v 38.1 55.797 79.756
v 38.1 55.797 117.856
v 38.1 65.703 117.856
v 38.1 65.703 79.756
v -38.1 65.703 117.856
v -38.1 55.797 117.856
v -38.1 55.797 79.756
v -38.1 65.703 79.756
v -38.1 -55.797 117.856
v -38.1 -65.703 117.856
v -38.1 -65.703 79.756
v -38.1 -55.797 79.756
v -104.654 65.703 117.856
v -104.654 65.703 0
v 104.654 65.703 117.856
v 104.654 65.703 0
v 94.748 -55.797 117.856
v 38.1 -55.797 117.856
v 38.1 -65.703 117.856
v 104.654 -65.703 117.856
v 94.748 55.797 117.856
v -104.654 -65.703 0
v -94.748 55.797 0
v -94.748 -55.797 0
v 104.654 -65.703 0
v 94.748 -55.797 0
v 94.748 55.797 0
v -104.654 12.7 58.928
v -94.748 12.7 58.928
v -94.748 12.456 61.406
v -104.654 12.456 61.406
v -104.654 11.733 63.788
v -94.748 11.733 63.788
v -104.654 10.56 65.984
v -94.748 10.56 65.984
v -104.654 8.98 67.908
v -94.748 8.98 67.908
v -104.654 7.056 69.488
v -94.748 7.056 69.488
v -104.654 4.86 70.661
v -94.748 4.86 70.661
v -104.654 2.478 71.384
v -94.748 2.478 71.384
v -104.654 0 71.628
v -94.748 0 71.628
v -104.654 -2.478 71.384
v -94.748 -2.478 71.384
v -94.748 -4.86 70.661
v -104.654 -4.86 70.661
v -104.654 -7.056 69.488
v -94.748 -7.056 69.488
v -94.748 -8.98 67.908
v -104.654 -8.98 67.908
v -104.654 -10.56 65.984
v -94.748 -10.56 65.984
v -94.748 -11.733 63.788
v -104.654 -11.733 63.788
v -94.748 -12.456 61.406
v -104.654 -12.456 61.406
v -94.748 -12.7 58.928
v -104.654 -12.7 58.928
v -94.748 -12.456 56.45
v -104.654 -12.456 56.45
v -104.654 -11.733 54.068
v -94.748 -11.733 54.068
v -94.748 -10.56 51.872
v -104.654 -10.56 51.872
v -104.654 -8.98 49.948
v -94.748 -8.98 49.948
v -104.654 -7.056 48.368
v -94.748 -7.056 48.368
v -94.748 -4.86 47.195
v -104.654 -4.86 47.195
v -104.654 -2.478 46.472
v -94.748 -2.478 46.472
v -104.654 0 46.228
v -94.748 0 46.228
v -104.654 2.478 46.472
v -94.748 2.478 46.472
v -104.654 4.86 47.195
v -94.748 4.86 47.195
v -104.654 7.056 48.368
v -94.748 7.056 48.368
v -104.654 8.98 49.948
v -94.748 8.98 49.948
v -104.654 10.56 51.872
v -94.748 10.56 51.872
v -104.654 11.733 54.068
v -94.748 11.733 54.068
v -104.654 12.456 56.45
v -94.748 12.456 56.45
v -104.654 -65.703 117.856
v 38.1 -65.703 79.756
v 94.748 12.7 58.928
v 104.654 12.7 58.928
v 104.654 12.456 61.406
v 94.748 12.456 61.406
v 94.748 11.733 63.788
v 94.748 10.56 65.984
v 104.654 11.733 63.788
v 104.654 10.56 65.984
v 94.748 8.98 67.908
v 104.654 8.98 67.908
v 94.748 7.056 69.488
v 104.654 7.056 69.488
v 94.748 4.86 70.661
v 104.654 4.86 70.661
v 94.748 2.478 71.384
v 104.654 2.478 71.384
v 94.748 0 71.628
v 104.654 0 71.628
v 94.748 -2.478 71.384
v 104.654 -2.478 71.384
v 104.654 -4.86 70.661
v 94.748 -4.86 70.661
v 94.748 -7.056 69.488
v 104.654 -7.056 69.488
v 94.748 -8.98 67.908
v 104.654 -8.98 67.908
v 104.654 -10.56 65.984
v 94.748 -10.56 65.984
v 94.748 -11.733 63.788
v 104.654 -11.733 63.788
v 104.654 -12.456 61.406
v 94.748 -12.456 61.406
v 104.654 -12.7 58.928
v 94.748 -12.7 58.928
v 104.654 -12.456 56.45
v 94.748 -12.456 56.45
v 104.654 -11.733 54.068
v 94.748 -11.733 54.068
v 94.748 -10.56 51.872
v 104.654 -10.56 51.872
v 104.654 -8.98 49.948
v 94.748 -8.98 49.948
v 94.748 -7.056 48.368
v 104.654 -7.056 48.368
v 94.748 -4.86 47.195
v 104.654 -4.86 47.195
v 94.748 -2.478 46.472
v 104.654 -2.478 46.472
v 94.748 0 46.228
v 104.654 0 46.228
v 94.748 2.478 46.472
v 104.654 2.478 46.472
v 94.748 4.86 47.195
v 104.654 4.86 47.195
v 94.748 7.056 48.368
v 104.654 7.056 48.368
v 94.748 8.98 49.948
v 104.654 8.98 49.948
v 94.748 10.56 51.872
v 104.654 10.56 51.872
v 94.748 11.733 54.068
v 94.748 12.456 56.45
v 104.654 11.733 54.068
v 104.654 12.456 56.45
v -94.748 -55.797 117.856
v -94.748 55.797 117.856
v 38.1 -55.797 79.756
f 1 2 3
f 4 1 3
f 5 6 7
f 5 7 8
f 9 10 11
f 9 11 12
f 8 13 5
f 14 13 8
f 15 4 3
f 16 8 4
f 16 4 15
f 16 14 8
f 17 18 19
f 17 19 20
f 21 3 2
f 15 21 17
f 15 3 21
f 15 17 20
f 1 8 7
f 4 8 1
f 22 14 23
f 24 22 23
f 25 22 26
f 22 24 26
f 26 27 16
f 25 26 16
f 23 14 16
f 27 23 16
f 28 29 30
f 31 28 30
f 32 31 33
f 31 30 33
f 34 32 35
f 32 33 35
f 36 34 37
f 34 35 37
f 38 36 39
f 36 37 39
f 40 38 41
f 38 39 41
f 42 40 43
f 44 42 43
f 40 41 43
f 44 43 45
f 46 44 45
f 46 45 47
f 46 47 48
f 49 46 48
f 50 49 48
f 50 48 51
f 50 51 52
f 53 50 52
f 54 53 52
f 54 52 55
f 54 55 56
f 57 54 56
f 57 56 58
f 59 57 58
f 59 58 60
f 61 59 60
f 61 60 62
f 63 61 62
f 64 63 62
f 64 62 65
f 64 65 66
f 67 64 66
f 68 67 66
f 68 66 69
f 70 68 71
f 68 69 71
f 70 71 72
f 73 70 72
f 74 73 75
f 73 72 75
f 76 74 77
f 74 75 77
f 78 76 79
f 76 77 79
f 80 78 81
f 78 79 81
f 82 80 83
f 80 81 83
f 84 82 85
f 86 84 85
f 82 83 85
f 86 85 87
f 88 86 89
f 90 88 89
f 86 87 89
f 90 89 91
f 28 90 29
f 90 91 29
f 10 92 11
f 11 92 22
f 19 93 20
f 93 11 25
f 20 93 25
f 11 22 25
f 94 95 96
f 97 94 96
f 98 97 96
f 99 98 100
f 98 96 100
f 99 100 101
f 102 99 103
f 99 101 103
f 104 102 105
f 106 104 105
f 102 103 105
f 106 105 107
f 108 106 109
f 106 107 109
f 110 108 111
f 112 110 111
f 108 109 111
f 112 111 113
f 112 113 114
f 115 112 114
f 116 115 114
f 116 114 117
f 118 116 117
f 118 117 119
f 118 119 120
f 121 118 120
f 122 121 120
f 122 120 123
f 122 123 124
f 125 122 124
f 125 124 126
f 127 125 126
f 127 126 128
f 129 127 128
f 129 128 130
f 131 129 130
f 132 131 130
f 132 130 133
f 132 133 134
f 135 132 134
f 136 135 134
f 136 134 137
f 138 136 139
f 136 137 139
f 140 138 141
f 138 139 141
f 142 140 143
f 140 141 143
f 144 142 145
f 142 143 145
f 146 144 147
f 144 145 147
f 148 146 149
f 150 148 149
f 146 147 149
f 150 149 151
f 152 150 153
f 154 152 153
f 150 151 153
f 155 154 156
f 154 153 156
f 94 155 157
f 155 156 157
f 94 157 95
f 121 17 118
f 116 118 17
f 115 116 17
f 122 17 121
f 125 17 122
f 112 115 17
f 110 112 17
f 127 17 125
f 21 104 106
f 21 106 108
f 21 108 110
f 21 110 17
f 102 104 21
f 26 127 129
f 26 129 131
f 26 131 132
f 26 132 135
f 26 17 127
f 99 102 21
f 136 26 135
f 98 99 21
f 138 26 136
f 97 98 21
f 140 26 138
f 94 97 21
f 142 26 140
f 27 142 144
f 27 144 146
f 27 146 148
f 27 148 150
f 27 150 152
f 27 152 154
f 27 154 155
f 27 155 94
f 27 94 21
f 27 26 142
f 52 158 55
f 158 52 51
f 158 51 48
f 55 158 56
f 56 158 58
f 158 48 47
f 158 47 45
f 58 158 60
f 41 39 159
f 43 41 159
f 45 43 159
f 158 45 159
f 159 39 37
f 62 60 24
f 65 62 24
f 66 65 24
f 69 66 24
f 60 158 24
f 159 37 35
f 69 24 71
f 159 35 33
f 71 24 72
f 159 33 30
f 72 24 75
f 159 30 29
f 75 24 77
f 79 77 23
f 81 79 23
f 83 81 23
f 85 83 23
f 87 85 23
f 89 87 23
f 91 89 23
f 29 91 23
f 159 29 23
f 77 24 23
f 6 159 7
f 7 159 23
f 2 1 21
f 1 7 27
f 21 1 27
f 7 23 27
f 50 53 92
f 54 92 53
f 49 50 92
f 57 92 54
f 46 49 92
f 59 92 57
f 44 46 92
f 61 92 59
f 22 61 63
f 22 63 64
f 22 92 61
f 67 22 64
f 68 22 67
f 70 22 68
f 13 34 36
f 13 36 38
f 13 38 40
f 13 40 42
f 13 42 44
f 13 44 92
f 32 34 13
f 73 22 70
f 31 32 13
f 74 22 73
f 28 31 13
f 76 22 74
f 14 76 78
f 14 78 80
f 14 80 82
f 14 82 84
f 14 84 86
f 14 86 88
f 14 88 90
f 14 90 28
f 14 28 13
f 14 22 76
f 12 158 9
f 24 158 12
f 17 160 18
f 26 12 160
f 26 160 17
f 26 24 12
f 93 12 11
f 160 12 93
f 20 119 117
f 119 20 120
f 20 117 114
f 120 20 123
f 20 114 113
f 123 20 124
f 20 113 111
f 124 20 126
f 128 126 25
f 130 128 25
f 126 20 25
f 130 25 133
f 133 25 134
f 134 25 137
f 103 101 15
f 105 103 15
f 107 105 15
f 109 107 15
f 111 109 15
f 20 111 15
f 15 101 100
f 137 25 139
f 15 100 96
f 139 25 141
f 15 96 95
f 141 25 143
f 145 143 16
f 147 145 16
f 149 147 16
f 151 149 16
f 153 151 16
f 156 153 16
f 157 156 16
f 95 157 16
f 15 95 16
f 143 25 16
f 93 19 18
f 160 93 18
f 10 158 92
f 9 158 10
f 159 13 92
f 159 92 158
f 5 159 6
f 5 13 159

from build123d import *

# Parameters (mm, degrees)
F0_W     = 209.3077600002
F0_H     = 131.40617311
F0_W_2   = 189.4957572222
F0_H_2   = 111.594170332
F1_DEPTH = 117.856
F2_W     = 76.2
F2_H     = 9.906001389
F3_DEPTH = 38.1
F4_R     = 12.7
F5_DEPTH = 209.3087600002


with BuildPart() as f1:
    # F0 (on Top) → F1 (new body)
    with BuildSketch(Plane.XY):
        Rectangle(F0_W, F0_H)
        Rectangle(F0_W_2, F0_H_2, mode=Mode.SUBTRACT)
    extrude(amount=F1_DEPTH)

    # F2 (on face) → F3 (cut)
    with BuildSketch(Plane.XY.offset(117.856)):
        with Locations((0, 60.7500858605)):
            Rectangle(F2_W, F2_H)
        with Locations((0, -60.7500858605)):
            Rectangle(F2_W, F2_H)
    extrude(amount=-F3_DEPTH, mode=Mode.SUBTRACT)

    # F4 (on face) → F5 (cut, through all)
    with BuildSketch(Plane.YZ.offset(104.6538800001)):
        with Locations((0, 58.928)):
            Circle(F4_R)
    extrude(amount=-F5_DEPTH, mode=Mode.SUBTRACT)


solid = f1.part
